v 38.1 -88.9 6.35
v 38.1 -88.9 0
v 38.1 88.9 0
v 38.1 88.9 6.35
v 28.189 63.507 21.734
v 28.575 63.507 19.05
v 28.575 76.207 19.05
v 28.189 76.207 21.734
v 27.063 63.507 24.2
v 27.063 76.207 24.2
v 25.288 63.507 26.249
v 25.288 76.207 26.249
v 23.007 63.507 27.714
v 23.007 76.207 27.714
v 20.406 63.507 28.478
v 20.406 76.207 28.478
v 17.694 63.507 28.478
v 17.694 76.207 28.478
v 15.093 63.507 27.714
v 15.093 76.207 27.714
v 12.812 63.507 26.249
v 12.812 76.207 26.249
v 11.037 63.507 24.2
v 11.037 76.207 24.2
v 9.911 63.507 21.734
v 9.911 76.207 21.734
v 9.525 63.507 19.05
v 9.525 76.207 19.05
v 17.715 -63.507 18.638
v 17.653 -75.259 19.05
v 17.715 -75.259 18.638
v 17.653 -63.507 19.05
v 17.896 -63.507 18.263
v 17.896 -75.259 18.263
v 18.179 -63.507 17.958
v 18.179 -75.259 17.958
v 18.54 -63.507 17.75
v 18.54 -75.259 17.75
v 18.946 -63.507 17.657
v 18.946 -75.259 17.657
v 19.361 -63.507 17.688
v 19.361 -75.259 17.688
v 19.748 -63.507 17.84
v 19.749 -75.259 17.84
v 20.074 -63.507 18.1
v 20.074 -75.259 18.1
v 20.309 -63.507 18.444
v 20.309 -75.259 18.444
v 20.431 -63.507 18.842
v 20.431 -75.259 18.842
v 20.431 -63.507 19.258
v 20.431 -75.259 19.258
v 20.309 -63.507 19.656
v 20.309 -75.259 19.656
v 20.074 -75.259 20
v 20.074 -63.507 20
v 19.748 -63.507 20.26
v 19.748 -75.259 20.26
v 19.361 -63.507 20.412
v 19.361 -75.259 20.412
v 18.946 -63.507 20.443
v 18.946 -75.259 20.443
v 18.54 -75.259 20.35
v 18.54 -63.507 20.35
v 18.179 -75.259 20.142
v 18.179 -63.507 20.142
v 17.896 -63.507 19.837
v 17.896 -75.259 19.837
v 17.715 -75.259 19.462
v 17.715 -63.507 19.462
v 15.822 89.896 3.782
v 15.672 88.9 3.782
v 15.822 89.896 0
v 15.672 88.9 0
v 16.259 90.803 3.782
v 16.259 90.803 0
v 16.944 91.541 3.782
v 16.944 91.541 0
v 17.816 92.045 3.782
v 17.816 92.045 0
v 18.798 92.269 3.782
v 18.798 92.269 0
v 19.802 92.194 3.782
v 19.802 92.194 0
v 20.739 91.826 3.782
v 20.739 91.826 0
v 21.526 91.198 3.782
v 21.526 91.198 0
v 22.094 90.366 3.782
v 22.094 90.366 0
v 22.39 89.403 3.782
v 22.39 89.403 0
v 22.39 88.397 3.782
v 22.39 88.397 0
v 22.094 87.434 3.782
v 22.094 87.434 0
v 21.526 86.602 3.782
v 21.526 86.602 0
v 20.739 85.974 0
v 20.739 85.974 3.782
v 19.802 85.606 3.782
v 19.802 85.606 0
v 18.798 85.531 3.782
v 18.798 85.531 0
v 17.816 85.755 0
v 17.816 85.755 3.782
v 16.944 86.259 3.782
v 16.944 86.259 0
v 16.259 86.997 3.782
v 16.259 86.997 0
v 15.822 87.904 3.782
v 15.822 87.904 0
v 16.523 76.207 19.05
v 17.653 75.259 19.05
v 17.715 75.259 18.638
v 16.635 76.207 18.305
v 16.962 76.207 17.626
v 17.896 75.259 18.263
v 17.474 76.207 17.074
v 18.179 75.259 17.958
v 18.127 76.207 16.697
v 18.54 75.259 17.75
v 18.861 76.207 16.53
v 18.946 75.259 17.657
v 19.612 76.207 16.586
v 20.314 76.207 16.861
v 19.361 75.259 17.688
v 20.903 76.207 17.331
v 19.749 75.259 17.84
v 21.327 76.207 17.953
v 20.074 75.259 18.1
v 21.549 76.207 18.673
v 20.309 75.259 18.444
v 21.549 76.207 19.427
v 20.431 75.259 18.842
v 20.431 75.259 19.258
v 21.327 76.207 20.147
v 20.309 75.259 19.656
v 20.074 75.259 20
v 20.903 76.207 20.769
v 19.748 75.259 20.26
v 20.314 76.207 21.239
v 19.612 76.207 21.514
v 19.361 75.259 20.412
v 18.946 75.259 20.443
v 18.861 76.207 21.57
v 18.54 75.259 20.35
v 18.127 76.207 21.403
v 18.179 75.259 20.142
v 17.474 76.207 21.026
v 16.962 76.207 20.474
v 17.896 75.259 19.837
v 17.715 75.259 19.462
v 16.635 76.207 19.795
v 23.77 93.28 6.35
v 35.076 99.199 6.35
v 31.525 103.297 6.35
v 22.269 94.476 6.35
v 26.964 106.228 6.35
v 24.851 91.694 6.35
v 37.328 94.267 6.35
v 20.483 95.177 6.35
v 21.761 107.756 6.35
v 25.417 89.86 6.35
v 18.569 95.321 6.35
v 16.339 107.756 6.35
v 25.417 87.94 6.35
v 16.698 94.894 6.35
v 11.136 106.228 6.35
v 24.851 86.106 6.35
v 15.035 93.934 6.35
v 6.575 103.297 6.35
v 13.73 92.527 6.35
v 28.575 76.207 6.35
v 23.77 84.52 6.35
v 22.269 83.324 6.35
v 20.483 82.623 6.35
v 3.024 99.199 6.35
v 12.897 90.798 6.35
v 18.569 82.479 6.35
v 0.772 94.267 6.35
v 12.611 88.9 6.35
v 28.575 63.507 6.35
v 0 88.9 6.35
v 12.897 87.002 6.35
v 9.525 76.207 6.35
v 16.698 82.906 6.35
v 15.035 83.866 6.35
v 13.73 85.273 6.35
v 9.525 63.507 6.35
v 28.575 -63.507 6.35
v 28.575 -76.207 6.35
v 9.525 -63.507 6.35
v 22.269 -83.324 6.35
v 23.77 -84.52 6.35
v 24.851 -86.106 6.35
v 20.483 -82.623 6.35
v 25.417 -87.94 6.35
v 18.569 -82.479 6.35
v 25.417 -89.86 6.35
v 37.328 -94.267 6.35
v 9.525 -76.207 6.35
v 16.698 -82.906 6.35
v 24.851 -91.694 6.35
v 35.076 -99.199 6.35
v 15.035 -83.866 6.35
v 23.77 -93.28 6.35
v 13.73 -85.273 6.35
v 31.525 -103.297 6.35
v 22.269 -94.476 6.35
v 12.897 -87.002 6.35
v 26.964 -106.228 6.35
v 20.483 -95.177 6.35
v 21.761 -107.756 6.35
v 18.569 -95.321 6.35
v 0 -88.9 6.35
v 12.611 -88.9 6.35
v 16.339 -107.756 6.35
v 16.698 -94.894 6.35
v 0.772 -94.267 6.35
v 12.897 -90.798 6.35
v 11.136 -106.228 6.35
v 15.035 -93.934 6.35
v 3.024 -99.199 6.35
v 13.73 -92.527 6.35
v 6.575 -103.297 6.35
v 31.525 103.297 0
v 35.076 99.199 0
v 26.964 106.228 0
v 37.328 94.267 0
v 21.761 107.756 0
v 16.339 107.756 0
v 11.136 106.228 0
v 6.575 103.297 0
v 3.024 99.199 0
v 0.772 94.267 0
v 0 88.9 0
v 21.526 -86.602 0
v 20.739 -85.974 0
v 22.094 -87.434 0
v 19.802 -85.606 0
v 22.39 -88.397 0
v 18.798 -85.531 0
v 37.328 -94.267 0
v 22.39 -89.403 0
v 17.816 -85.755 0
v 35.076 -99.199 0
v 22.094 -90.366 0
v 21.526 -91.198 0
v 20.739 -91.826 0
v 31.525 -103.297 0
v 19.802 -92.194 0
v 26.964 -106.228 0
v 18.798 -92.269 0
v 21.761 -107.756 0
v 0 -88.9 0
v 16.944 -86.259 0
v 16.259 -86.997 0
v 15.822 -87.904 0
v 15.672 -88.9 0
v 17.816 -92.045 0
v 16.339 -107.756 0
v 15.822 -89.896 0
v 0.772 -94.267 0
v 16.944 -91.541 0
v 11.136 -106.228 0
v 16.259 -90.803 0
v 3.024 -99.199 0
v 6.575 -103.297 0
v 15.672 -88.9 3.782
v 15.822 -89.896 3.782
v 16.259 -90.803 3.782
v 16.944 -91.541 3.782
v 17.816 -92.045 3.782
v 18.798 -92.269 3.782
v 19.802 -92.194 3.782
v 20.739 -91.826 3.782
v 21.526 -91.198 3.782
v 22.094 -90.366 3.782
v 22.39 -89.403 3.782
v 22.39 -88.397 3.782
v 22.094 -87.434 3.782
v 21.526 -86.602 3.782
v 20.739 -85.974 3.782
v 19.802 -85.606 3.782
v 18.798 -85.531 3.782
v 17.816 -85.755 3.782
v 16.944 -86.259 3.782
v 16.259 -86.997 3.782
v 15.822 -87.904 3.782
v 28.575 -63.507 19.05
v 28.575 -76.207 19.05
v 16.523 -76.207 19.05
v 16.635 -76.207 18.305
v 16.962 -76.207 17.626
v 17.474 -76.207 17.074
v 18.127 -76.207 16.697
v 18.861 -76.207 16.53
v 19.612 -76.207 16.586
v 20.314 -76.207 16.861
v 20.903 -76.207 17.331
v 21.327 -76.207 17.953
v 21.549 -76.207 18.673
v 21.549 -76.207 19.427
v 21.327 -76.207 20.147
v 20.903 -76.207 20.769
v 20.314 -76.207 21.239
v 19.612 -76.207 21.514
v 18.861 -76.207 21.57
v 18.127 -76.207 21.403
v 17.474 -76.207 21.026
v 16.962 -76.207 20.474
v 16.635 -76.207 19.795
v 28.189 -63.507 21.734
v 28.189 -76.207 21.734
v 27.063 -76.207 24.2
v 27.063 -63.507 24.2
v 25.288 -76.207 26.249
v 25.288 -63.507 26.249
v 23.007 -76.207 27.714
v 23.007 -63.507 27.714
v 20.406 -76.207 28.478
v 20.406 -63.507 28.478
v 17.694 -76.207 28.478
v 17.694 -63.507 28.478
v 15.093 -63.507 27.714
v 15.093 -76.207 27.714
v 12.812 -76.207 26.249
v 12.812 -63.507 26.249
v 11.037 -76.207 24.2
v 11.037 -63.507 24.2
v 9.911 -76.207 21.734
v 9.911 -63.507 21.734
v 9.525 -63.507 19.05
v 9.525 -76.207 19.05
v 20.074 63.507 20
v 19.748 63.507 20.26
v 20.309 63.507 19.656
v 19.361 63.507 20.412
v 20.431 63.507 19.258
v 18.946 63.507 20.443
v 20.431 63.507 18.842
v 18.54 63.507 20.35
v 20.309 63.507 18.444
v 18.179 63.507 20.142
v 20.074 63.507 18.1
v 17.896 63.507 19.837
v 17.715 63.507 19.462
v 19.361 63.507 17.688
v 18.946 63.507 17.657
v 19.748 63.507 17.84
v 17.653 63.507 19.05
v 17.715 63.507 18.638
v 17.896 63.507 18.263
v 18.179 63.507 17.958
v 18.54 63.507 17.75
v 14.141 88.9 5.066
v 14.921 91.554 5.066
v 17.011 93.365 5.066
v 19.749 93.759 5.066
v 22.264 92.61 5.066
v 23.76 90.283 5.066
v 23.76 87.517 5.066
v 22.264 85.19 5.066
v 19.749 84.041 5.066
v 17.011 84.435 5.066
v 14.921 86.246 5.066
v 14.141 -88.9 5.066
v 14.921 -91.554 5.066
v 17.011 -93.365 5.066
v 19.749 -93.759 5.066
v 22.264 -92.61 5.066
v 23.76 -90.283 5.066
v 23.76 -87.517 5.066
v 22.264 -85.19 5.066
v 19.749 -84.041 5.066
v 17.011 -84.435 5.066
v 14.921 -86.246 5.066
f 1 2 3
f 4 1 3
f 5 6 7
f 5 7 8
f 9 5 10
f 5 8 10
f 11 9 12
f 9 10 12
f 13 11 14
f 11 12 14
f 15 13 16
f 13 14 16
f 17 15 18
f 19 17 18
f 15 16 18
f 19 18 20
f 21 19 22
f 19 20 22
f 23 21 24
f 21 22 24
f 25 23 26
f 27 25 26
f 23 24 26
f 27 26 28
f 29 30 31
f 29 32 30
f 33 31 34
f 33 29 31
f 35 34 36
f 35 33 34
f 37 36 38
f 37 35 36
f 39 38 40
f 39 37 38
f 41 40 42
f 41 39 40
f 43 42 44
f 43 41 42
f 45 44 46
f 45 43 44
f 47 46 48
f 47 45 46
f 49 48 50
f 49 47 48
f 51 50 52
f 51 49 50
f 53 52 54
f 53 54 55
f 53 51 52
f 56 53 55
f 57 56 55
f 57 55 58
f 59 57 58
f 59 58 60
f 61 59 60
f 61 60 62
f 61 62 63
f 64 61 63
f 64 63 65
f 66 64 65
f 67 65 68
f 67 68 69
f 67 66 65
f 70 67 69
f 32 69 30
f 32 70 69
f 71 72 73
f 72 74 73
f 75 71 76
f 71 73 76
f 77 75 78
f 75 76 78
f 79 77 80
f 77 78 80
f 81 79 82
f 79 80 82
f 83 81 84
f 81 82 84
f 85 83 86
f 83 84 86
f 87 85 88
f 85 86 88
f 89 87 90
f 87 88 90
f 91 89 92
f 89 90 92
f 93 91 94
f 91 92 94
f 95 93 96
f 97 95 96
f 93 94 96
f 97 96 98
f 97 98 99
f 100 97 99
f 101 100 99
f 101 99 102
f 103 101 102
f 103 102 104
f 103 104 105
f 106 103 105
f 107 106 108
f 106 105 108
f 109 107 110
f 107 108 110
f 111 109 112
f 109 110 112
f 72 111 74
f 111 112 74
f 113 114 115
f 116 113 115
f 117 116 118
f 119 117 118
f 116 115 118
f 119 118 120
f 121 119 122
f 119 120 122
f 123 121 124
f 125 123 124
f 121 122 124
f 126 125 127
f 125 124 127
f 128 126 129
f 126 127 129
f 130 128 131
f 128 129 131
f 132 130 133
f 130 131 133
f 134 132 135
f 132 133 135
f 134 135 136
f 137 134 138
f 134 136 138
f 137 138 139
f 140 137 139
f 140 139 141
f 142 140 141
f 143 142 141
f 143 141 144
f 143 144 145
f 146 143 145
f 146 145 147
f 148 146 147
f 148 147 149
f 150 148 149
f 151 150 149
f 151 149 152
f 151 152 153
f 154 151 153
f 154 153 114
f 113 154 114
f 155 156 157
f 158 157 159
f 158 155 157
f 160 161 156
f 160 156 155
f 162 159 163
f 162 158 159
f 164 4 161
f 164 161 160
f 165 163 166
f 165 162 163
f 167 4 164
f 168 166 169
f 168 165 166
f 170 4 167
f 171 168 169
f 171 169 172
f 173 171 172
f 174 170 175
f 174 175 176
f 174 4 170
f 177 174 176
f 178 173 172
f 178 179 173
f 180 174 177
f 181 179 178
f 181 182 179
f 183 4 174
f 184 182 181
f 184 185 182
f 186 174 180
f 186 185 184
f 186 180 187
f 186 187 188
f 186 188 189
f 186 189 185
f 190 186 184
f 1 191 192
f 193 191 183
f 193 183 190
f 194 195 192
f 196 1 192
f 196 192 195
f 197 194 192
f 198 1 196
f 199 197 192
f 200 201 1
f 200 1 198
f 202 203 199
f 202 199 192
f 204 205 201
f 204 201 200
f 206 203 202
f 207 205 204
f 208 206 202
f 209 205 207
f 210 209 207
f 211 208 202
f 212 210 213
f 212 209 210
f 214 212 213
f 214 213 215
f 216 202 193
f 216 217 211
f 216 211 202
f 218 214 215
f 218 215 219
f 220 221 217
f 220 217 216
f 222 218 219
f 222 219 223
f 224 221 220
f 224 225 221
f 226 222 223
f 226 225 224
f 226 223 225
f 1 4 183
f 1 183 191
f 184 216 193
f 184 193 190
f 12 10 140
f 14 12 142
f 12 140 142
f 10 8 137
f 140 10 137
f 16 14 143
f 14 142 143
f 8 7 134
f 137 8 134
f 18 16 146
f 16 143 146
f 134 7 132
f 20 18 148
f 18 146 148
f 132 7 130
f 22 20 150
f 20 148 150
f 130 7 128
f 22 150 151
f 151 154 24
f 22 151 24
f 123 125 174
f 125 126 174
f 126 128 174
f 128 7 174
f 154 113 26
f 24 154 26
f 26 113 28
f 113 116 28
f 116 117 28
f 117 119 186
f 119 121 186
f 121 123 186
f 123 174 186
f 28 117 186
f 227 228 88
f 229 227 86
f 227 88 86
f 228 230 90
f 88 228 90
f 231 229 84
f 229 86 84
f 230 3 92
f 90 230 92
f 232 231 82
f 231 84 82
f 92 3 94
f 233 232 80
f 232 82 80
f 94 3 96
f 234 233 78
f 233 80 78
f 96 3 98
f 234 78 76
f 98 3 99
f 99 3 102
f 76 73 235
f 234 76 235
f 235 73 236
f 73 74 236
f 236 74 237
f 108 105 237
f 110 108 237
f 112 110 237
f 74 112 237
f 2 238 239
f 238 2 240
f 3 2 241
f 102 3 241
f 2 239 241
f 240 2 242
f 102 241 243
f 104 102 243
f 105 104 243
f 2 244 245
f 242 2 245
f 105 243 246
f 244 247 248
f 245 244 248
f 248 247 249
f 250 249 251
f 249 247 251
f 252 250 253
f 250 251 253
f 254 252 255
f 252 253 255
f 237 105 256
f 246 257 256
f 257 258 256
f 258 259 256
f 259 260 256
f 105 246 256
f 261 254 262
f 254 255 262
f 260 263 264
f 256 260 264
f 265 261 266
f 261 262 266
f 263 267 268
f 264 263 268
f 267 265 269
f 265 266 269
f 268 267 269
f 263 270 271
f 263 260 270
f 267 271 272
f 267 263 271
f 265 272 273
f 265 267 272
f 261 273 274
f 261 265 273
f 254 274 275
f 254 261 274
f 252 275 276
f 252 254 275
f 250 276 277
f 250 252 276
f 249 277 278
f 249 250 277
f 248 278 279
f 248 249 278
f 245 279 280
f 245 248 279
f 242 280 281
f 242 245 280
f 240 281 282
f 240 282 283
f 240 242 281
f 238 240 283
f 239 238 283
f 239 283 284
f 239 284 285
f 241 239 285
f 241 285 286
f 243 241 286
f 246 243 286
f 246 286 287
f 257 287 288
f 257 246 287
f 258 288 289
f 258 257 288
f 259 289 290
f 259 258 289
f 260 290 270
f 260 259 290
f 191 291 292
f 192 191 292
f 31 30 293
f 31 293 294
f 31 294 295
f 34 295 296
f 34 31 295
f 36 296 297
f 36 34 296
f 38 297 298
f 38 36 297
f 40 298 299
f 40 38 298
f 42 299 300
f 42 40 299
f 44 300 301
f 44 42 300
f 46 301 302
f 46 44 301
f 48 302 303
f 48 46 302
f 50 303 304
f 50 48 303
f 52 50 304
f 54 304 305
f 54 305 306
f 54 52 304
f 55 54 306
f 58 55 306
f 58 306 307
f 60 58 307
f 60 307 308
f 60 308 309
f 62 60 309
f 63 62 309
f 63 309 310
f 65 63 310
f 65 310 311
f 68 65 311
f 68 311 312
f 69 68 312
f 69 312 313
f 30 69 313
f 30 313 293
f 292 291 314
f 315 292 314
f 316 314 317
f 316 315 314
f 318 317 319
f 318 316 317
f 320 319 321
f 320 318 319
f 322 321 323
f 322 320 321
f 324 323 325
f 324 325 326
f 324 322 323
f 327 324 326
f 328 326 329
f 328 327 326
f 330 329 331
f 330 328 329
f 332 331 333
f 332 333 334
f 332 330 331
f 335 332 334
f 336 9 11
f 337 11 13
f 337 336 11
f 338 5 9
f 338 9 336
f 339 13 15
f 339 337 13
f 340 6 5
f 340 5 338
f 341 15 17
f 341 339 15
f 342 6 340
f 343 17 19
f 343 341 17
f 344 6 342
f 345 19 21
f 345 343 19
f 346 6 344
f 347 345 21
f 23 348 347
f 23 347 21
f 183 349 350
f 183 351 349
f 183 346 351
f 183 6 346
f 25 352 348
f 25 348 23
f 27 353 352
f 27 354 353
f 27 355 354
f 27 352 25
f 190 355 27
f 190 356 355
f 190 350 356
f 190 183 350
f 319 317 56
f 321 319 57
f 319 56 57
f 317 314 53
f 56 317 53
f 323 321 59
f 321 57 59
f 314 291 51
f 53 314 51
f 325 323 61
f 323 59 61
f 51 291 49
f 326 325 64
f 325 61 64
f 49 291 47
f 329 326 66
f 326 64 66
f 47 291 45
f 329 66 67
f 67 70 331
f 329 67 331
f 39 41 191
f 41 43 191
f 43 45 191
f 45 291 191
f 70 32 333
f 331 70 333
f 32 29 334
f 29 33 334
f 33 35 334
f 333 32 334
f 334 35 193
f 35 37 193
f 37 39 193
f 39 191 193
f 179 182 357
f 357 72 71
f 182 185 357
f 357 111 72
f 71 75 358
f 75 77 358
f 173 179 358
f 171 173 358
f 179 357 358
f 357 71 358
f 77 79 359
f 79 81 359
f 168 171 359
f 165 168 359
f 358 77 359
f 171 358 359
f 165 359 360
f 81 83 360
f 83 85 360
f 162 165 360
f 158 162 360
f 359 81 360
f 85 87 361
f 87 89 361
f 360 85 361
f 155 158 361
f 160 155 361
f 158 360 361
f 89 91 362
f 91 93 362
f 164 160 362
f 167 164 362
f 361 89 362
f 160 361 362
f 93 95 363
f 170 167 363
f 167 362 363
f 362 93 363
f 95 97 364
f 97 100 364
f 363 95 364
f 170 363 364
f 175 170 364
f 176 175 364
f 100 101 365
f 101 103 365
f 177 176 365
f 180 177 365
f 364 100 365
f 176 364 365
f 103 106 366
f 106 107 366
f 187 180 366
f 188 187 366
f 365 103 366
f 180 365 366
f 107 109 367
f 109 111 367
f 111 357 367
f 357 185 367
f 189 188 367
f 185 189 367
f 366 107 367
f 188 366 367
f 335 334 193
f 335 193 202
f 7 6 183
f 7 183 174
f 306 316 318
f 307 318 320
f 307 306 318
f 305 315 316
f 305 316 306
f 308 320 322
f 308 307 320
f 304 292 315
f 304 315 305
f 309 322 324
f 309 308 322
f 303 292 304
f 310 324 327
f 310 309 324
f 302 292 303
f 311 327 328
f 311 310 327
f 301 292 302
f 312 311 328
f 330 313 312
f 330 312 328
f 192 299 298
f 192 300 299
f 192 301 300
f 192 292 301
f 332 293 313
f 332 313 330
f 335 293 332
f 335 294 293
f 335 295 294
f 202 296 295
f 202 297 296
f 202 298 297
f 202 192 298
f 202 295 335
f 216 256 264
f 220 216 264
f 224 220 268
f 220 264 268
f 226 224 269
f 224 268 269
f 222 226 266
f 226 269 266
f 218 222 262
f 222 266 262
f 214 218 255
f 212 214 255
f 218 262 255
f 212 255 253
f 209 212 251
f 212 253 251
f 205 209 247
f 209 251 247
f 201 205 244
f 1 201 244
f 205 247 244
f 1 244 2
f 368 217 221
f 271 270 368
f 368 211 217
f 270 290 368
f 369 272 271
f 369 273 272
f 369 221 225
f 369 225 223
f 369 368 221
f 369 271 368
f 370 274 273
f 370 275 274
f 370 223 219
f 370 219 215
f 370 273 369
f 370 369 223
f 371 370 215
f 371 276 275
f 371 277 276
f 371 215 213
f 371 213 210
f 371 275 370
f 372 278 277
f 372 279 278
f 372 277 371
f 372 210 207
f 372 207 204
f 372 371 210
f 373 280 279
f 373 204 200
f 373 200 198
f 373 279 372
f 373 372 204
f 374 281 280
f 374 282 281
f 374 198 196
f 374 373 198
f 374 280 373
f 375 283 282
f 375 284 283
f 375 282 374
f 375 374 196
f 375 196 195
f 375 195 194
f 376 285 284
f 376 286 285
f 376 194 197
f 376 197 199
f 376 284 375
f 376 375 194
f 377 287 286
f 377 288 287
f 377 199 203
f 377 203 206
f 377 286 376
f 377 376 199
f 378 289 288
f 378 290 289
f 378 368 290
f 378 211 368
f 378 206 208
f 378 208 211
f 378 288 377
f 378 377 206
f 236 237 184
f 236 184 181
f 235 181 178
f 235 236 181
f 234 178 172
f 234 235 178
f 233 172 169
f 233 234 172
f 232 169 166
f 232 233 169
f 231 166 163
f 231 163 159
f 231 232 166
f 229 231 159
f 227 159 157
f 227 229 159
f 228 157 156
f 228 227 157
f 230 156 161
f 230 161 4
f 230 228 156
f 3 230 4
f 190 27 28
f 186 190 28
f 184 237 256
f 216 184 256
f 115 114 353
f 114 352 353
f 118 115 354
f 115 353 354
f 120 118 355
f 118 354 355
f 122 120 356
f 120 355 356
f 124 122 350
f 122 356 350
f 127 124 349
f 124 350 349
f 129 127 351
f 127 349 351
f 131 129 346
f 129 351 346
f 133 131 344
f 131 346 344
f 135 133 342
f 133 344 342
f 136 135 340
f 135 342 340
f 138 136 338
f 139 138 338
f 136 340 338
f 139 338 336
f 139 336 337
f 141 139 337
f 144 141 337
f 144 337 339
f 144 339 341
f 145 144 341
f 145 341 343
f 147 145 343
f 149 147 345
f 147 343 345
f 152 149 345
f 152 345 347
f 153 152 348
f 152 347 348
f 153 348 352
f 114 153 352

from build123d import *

# Parameters (mm, degrees)
BOSS_EXTRUDE1_DEPTH                                 = 6.35
CSK_FOR_1_4_FLAT_HEAD_MACHINE_SCREW_100_D           = 6.7564
CSK_FOR_1_4_FLAT_HEAD_MACHINE_SCREW_100_CSINK_D     = 12.8778
CSK_FOR_1_4_FLAT_HEAD_MACHINE_SCREW_100_CSINK_ANGLE = 100
SKETCH8_W                                           = 19.05
SKETCH8_H                                           = 12.7
BOSS_EXTRUDE2_DEPTH                                 = 12.7
BOSS_EXTRUDE4_DEPTH                                 = 12.7
CSK_FOR_3_FLAT_HEAD_MACHINE_SCREW_100_D             = 2.794
CSK_FOR_3_FLAT_HEAD_MACHINE_SCREW_100_CSINK_D       = 5.0546
CSK_FOR_3_FLAT_HEAD_MACHINE_SCREW_100_CSINK_ANGLE   = 100


with BuildPart() as part:
    # Sketch2 → Boss-Extrude1 (new body)
    with BuildSketch(Plane.XY):
        with BuildLine():
            Line((0, 0), (0, 88.9))
            ThreePointArc((0, 88.9), (19.05, 107.95), (38.1, 88.9))
            Line((38.1, 88.9), (38.1, 0))
            Line((38.1, 0), (0, 0))
        make_face()
    extrude(amount=BOSS_EXTRUDE1_DEPTH)

    # CSK for 1/4 Flat Head Machine Screw (100)2 (through all)
    with Locations(Plane.XY.offset(6.35)):
        with Locations((19.05, 88.9)):
            CounterSinkHole(CSK_FOR_1_4_FLAT_HEAD_MACHINE_SCREW_100_D / 2, CSK_FOR_1_4_FLAT_HEAD_MACHINE_SCREW_100_CSINK_D / 2, counter_sink_angle=CSK_FOR_1_4_FLAT_HEAD_MACHINE_SCREW_100_CSINK_ANGLE)

    # Sketch8 → Boss-Extrude2 (add)
    with BuildSketch(Plane.XY.offset(6.35)):
        with Locations((19.05, 69.857100744)):
            Rectangle(SKETCH8_W, SKETCH8_H)
    extrude(amount=BOSS_EXTRUDE2_DEPTH)

    # Sketch10 → Boss-Extrude4 (add)
    with BuildSketch(Plane(origin=(0, 76.207100744, 0), x_dir=(1, 0, 0), z_dir=(0, 1, 0))):
        with BuildLine():
            Line((9.525, -19.05), (28.575, -19.05))
            ThreePointArc((28.575, -19.05), (19.05, -28.575), (9.525, -19.05))
        make_face()
    extrude(amount=-BOSS_EXTRUDE4_DEPTH)

    # CSK for #3 Flat Head Machine Screw (100)1 (through all)
    with Locations(Plane(origin=(0, 76.207100744, 0), x_dir=(1, 0, 0), z_dir=(0, 1, 0))):
        with Locations((19.05, -19.05)):
            CounterSinkHole(CSK_FOR_3_FLAT_HEAD_MACHINE_SCREW_100_D / 2, CSK_FOR_3_FLAT_HEAD_MACHINE_SCREW_100_CSINK_D / 2, counter_sink_angle=CSK_FOR_3_FLAT_HEAD_MACHINE_SCREW_100_CSINK_ANGLE)

    # Mirror1: part across plane


with BuildPart() as part_1:
    add(part.part)
    add(part.part.mirror(Plane(origin=(38.1, 0, 6.35), x_dir=(0, 0, 1), z_dir=(0, 1, 0))))


solid = part_1.part
